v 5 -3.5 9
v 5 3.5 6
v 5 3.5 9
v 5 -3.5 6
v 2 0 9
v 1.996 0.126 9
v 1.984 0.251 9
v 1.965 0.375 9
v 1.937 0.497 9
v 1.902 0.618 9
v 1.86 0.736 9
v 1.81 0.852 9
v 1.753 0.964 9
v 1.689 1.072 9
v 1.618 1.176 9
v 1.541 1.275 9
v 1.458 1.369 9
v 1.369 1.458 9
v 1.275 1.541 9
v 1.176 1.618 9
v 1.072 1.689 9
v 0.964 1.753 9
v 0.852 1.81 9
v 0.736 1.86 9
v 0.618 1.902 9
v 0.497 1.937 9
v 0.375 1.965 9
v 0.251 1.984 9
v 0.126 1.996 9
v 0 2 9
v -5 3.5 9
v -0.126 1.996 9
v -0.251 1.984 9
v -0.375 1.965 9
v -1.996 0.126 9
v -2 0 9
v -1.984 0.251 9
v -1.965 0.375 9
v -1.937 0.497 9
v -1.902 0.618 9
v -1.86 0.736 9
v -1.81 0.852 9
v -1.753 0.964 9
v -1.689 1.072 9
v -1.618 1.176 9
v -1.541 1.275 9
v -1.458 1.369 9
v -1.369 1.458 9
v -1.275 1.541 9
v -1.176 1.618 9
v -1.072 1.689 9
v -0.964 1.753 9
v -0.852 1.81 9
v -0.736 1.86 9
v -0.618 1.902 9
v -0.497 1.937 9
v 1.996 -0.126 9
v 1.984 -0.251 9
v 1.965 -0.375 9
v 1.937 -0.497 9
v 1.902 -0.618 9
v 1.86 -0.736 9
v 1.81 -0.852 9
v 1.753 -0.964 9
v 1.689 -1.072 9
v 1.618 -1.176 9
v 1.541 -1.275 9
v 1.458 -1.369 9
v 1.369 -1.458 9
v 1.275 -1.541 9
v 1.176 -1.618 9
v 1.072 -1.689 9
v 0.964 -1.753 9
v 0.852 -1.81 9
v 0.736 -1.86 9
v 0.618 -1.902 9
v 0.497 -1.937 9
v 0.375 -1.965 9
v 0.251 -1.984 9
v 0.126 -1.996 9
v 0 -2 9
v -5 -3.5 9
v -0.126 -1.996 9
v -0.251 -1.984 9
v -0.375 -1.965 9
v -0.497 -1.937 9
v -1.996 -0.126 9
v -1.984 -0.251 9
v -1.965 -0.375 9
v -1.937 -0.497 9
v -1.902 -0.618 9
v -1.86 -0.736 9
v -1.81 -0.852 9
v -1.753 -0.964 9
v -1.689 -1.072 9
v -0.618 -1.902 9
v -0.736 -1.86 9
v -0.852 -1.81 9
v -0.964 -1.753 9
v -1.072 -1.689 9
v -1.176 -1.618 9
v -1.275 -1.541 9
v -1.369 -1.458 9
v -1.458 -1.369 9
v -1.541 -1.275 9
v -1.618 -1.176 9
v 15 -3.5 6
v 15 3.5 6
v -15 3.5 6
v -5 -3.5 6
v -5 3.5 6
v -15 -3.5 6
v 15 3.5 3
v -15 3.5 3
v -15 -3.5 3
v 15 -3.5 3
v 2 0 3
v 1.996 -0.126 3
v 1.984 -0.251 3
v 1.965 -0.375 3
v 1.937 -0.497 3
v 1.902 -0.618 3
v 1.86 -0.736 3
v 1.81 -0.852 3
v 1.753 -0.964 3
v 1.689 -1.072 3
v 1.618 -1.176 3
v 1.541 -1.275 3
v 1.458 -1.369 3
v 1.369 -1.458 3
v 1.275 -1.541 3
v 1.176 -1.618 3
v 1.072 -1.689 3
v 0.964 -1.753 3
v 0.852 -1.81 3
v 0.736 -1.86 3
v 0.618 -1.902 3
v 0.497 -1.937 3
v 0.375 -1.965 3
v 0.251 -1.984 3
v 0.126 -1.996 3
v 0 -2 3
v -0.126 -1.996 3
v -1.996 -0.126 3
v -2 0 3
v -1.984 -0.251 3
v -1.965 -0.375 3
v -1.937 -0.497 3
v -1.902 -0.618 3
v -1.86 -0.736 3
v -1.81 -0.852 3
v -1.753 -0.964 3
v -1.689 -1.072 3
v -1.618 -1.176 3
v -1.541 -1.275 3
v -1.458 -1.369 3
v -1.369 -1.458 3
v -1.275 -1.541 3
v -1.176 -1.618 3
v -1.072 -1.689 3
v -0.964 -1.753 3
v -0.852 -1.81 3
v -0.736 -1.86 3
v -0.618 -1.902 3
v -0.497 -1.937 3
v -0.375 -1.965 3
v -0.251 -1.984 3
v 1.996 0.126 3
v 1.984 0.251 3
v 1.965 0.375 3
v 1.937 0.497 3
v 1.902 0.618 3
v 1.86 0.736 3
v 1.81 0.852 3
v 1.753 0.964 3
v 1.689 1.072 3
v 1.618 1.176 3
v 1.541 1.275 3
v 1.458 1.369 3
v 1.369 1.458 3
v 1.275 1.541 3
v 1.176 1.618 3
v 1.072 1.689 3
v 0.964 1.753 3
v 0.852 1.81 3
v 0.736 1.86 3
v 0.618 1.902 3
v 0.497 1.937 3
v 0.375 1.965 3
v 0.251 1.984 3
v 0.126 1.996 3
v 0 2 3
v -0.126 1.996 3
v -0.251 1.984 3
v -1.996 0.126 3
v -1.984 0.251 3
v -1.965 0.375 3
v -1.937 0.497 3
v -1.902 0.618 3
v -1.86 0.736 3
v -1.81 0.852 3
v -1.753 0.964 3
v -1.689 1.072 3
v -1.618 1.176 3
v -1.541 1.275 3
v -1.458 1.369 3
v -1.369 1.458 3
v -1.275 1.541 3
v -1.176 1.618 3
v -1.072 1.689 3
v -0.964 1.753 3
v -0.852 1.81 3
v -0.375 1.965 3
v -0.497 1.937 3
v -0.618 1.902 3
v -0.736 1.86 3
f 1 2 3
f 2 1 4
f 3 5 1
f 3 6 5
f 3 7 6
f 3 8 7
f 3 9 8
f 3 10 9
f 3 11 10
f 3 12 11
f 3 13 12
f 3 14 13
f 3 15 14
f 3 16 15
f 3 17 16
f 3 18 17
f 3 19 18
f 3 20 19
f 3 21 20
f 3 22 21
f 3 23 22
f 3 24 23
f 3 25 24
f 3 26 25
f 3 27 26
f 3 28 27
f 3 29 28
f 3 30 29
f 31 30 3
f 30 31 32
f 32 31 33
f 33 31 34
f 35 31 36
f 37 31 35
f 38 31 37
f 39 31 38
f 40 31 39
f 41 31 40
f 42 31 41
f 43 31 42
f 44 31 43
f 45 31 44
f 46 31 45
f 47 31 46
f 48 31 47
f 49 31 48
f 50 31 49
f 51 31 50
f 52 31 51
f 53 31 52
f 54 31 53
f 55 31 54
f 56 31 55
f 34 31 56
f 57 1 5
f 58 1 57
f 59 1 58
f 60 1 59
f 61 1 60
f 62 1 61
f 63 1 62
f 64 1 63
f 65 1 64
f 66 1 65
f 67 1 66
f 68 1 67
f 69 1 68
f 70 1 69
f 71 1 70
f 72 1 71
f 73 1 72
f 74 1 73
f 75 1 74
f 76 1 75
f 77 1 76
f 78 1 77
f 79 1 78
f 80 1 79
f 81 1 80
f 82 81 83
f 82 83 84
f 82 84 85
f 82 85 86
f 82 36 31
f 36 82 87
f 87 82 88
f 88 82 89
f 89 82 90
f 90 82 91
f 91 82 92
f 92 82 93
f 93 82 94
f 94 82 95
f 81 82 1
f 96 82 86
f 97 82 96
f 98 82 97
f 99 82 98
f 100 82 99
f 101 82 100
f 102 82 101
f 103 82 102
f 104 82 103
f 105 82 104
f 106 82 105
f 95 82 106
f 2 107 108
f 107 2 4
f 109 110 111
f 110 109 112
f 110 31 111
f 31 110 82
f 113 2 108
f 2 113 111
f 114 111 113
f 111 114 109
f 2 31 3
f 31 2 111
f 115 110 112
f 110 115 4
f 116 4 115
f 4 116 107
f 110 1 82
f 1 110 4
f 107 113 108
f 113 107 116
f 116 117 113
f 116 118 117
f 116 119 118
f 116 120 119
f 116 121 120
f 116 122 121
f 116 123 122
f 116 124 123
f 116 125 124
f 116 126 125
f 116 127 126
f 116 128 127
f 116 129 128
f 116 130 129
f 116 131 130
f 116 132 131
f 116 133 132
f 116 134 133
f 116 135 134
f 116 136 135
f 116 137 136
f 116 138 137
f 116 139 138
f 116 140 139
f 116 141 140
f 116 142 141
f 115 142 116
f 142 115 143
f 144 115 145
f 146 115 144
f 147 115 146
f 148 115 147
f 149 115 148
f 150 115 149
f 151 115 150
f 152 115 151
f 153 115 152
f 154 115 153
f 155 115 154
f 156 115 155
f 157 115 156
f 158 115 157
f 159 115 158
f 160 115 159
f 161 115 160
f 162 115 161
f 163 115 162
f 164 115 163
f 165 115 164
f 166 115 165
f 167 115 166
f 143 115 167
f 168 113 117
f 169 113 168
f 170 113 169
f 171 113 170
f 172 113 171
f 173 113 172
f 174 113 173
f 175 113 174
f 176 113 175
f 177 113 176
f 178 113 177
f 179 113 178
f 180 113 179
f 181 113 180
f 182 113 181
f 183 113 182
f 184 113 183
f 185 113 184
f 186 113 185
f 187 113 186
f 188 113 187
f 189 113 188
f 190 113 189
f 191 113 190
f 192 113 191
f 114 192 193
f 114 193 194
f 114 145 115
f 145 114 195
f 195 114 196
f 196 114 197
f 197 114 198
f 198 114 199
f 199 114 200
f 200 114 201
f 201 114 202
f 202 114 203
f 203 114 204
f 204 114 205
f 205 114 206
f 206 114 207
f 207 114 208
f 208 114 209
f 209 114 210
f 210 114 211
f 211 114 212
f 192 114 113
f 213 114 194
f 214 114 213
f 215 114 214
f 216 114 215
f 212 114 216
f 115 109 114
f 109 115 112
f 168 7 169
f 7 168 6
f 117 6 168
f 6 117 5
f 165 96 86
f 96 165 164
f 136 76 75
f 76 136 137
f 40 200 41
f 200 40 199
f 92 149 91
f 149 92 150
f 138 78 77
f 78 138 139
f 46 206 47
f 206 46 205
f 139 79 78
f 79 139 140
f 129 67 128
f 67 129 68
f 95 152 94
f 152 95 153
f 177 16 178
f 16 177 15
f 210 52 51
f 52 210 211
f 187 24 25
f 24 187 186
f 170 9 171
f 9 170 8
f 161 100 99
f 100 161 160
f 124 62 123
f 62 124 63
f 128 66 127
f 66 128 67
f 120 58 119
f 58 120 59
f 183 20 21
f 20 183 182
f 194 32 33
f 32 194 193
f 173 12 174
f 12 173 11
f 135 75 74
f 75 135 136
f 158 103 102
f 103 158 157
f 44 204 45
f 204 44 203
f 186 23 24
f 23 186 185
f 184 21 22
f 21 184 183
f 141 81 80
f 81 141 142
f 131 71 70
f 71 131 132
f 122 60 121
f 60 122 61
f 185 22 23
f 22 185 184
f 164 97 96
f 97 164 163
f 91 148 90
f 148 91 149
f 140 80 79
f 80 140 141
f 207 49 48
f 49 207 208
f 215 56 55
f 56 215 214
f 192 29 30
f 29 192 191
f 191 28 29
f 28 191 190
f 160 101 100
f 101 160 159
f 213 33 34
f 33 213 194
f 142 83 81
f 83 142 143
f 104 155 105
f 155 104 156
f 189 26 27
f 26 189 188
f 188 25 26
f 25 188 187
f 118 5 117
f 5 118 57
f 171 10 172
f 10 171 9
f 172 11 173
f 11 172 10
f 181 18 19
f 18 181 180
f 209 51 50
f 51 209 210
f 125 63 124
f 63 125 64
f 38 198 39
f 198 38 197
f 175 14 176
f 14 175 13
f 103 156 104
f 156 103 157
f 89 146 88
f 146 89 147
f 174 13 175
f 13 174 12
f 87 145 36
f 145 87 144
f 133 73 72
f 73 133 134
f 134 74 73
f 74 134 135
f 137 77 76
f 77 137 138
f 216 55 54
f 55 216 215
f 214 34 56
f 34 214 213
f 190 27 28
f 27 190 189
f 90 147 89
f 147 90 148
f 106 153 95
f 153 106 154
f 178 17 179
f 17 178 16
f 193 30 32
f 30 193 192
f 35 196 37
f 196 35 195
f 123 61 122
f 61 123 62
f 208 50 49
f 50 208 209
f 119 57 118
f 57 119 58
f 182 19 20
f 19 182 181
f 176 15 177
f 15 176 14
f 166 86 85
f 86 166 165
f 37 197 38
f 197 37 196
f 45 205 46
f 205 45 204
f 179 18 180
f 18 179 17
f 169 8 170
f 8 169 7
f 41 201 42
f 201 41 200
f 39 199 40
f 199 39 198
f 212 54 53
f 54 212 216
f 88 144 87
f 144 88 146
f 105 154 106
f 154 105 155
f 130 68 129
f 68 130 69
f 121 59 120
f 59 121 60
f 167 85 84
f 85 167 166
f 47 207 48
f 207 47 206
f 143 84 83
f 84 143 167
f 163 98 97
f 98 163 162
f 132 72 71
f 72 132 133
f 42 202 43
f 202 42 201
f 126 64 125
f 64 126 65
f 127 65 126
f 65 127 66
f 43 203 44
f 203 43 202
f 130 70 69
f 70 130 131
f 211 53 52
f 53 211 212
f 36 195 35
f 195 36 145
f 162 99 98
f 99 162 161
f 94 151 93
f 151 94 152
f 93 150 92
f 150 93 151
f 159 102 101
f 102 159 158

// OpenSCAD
difference(){
	union(){
        translate([-5,-3.5,6]){
           cube([10,7,3], center=false);
        }
        translate([-15,-3.5,3]){
           cube([30,7,3], center=false);
        }
 
	}
	union() {
        translate([0,0,-1]){
            rotate([0,0,0]){
                cylinder(h=20, r=2, $fn=100, center=false);
            }
        }


	}
}
